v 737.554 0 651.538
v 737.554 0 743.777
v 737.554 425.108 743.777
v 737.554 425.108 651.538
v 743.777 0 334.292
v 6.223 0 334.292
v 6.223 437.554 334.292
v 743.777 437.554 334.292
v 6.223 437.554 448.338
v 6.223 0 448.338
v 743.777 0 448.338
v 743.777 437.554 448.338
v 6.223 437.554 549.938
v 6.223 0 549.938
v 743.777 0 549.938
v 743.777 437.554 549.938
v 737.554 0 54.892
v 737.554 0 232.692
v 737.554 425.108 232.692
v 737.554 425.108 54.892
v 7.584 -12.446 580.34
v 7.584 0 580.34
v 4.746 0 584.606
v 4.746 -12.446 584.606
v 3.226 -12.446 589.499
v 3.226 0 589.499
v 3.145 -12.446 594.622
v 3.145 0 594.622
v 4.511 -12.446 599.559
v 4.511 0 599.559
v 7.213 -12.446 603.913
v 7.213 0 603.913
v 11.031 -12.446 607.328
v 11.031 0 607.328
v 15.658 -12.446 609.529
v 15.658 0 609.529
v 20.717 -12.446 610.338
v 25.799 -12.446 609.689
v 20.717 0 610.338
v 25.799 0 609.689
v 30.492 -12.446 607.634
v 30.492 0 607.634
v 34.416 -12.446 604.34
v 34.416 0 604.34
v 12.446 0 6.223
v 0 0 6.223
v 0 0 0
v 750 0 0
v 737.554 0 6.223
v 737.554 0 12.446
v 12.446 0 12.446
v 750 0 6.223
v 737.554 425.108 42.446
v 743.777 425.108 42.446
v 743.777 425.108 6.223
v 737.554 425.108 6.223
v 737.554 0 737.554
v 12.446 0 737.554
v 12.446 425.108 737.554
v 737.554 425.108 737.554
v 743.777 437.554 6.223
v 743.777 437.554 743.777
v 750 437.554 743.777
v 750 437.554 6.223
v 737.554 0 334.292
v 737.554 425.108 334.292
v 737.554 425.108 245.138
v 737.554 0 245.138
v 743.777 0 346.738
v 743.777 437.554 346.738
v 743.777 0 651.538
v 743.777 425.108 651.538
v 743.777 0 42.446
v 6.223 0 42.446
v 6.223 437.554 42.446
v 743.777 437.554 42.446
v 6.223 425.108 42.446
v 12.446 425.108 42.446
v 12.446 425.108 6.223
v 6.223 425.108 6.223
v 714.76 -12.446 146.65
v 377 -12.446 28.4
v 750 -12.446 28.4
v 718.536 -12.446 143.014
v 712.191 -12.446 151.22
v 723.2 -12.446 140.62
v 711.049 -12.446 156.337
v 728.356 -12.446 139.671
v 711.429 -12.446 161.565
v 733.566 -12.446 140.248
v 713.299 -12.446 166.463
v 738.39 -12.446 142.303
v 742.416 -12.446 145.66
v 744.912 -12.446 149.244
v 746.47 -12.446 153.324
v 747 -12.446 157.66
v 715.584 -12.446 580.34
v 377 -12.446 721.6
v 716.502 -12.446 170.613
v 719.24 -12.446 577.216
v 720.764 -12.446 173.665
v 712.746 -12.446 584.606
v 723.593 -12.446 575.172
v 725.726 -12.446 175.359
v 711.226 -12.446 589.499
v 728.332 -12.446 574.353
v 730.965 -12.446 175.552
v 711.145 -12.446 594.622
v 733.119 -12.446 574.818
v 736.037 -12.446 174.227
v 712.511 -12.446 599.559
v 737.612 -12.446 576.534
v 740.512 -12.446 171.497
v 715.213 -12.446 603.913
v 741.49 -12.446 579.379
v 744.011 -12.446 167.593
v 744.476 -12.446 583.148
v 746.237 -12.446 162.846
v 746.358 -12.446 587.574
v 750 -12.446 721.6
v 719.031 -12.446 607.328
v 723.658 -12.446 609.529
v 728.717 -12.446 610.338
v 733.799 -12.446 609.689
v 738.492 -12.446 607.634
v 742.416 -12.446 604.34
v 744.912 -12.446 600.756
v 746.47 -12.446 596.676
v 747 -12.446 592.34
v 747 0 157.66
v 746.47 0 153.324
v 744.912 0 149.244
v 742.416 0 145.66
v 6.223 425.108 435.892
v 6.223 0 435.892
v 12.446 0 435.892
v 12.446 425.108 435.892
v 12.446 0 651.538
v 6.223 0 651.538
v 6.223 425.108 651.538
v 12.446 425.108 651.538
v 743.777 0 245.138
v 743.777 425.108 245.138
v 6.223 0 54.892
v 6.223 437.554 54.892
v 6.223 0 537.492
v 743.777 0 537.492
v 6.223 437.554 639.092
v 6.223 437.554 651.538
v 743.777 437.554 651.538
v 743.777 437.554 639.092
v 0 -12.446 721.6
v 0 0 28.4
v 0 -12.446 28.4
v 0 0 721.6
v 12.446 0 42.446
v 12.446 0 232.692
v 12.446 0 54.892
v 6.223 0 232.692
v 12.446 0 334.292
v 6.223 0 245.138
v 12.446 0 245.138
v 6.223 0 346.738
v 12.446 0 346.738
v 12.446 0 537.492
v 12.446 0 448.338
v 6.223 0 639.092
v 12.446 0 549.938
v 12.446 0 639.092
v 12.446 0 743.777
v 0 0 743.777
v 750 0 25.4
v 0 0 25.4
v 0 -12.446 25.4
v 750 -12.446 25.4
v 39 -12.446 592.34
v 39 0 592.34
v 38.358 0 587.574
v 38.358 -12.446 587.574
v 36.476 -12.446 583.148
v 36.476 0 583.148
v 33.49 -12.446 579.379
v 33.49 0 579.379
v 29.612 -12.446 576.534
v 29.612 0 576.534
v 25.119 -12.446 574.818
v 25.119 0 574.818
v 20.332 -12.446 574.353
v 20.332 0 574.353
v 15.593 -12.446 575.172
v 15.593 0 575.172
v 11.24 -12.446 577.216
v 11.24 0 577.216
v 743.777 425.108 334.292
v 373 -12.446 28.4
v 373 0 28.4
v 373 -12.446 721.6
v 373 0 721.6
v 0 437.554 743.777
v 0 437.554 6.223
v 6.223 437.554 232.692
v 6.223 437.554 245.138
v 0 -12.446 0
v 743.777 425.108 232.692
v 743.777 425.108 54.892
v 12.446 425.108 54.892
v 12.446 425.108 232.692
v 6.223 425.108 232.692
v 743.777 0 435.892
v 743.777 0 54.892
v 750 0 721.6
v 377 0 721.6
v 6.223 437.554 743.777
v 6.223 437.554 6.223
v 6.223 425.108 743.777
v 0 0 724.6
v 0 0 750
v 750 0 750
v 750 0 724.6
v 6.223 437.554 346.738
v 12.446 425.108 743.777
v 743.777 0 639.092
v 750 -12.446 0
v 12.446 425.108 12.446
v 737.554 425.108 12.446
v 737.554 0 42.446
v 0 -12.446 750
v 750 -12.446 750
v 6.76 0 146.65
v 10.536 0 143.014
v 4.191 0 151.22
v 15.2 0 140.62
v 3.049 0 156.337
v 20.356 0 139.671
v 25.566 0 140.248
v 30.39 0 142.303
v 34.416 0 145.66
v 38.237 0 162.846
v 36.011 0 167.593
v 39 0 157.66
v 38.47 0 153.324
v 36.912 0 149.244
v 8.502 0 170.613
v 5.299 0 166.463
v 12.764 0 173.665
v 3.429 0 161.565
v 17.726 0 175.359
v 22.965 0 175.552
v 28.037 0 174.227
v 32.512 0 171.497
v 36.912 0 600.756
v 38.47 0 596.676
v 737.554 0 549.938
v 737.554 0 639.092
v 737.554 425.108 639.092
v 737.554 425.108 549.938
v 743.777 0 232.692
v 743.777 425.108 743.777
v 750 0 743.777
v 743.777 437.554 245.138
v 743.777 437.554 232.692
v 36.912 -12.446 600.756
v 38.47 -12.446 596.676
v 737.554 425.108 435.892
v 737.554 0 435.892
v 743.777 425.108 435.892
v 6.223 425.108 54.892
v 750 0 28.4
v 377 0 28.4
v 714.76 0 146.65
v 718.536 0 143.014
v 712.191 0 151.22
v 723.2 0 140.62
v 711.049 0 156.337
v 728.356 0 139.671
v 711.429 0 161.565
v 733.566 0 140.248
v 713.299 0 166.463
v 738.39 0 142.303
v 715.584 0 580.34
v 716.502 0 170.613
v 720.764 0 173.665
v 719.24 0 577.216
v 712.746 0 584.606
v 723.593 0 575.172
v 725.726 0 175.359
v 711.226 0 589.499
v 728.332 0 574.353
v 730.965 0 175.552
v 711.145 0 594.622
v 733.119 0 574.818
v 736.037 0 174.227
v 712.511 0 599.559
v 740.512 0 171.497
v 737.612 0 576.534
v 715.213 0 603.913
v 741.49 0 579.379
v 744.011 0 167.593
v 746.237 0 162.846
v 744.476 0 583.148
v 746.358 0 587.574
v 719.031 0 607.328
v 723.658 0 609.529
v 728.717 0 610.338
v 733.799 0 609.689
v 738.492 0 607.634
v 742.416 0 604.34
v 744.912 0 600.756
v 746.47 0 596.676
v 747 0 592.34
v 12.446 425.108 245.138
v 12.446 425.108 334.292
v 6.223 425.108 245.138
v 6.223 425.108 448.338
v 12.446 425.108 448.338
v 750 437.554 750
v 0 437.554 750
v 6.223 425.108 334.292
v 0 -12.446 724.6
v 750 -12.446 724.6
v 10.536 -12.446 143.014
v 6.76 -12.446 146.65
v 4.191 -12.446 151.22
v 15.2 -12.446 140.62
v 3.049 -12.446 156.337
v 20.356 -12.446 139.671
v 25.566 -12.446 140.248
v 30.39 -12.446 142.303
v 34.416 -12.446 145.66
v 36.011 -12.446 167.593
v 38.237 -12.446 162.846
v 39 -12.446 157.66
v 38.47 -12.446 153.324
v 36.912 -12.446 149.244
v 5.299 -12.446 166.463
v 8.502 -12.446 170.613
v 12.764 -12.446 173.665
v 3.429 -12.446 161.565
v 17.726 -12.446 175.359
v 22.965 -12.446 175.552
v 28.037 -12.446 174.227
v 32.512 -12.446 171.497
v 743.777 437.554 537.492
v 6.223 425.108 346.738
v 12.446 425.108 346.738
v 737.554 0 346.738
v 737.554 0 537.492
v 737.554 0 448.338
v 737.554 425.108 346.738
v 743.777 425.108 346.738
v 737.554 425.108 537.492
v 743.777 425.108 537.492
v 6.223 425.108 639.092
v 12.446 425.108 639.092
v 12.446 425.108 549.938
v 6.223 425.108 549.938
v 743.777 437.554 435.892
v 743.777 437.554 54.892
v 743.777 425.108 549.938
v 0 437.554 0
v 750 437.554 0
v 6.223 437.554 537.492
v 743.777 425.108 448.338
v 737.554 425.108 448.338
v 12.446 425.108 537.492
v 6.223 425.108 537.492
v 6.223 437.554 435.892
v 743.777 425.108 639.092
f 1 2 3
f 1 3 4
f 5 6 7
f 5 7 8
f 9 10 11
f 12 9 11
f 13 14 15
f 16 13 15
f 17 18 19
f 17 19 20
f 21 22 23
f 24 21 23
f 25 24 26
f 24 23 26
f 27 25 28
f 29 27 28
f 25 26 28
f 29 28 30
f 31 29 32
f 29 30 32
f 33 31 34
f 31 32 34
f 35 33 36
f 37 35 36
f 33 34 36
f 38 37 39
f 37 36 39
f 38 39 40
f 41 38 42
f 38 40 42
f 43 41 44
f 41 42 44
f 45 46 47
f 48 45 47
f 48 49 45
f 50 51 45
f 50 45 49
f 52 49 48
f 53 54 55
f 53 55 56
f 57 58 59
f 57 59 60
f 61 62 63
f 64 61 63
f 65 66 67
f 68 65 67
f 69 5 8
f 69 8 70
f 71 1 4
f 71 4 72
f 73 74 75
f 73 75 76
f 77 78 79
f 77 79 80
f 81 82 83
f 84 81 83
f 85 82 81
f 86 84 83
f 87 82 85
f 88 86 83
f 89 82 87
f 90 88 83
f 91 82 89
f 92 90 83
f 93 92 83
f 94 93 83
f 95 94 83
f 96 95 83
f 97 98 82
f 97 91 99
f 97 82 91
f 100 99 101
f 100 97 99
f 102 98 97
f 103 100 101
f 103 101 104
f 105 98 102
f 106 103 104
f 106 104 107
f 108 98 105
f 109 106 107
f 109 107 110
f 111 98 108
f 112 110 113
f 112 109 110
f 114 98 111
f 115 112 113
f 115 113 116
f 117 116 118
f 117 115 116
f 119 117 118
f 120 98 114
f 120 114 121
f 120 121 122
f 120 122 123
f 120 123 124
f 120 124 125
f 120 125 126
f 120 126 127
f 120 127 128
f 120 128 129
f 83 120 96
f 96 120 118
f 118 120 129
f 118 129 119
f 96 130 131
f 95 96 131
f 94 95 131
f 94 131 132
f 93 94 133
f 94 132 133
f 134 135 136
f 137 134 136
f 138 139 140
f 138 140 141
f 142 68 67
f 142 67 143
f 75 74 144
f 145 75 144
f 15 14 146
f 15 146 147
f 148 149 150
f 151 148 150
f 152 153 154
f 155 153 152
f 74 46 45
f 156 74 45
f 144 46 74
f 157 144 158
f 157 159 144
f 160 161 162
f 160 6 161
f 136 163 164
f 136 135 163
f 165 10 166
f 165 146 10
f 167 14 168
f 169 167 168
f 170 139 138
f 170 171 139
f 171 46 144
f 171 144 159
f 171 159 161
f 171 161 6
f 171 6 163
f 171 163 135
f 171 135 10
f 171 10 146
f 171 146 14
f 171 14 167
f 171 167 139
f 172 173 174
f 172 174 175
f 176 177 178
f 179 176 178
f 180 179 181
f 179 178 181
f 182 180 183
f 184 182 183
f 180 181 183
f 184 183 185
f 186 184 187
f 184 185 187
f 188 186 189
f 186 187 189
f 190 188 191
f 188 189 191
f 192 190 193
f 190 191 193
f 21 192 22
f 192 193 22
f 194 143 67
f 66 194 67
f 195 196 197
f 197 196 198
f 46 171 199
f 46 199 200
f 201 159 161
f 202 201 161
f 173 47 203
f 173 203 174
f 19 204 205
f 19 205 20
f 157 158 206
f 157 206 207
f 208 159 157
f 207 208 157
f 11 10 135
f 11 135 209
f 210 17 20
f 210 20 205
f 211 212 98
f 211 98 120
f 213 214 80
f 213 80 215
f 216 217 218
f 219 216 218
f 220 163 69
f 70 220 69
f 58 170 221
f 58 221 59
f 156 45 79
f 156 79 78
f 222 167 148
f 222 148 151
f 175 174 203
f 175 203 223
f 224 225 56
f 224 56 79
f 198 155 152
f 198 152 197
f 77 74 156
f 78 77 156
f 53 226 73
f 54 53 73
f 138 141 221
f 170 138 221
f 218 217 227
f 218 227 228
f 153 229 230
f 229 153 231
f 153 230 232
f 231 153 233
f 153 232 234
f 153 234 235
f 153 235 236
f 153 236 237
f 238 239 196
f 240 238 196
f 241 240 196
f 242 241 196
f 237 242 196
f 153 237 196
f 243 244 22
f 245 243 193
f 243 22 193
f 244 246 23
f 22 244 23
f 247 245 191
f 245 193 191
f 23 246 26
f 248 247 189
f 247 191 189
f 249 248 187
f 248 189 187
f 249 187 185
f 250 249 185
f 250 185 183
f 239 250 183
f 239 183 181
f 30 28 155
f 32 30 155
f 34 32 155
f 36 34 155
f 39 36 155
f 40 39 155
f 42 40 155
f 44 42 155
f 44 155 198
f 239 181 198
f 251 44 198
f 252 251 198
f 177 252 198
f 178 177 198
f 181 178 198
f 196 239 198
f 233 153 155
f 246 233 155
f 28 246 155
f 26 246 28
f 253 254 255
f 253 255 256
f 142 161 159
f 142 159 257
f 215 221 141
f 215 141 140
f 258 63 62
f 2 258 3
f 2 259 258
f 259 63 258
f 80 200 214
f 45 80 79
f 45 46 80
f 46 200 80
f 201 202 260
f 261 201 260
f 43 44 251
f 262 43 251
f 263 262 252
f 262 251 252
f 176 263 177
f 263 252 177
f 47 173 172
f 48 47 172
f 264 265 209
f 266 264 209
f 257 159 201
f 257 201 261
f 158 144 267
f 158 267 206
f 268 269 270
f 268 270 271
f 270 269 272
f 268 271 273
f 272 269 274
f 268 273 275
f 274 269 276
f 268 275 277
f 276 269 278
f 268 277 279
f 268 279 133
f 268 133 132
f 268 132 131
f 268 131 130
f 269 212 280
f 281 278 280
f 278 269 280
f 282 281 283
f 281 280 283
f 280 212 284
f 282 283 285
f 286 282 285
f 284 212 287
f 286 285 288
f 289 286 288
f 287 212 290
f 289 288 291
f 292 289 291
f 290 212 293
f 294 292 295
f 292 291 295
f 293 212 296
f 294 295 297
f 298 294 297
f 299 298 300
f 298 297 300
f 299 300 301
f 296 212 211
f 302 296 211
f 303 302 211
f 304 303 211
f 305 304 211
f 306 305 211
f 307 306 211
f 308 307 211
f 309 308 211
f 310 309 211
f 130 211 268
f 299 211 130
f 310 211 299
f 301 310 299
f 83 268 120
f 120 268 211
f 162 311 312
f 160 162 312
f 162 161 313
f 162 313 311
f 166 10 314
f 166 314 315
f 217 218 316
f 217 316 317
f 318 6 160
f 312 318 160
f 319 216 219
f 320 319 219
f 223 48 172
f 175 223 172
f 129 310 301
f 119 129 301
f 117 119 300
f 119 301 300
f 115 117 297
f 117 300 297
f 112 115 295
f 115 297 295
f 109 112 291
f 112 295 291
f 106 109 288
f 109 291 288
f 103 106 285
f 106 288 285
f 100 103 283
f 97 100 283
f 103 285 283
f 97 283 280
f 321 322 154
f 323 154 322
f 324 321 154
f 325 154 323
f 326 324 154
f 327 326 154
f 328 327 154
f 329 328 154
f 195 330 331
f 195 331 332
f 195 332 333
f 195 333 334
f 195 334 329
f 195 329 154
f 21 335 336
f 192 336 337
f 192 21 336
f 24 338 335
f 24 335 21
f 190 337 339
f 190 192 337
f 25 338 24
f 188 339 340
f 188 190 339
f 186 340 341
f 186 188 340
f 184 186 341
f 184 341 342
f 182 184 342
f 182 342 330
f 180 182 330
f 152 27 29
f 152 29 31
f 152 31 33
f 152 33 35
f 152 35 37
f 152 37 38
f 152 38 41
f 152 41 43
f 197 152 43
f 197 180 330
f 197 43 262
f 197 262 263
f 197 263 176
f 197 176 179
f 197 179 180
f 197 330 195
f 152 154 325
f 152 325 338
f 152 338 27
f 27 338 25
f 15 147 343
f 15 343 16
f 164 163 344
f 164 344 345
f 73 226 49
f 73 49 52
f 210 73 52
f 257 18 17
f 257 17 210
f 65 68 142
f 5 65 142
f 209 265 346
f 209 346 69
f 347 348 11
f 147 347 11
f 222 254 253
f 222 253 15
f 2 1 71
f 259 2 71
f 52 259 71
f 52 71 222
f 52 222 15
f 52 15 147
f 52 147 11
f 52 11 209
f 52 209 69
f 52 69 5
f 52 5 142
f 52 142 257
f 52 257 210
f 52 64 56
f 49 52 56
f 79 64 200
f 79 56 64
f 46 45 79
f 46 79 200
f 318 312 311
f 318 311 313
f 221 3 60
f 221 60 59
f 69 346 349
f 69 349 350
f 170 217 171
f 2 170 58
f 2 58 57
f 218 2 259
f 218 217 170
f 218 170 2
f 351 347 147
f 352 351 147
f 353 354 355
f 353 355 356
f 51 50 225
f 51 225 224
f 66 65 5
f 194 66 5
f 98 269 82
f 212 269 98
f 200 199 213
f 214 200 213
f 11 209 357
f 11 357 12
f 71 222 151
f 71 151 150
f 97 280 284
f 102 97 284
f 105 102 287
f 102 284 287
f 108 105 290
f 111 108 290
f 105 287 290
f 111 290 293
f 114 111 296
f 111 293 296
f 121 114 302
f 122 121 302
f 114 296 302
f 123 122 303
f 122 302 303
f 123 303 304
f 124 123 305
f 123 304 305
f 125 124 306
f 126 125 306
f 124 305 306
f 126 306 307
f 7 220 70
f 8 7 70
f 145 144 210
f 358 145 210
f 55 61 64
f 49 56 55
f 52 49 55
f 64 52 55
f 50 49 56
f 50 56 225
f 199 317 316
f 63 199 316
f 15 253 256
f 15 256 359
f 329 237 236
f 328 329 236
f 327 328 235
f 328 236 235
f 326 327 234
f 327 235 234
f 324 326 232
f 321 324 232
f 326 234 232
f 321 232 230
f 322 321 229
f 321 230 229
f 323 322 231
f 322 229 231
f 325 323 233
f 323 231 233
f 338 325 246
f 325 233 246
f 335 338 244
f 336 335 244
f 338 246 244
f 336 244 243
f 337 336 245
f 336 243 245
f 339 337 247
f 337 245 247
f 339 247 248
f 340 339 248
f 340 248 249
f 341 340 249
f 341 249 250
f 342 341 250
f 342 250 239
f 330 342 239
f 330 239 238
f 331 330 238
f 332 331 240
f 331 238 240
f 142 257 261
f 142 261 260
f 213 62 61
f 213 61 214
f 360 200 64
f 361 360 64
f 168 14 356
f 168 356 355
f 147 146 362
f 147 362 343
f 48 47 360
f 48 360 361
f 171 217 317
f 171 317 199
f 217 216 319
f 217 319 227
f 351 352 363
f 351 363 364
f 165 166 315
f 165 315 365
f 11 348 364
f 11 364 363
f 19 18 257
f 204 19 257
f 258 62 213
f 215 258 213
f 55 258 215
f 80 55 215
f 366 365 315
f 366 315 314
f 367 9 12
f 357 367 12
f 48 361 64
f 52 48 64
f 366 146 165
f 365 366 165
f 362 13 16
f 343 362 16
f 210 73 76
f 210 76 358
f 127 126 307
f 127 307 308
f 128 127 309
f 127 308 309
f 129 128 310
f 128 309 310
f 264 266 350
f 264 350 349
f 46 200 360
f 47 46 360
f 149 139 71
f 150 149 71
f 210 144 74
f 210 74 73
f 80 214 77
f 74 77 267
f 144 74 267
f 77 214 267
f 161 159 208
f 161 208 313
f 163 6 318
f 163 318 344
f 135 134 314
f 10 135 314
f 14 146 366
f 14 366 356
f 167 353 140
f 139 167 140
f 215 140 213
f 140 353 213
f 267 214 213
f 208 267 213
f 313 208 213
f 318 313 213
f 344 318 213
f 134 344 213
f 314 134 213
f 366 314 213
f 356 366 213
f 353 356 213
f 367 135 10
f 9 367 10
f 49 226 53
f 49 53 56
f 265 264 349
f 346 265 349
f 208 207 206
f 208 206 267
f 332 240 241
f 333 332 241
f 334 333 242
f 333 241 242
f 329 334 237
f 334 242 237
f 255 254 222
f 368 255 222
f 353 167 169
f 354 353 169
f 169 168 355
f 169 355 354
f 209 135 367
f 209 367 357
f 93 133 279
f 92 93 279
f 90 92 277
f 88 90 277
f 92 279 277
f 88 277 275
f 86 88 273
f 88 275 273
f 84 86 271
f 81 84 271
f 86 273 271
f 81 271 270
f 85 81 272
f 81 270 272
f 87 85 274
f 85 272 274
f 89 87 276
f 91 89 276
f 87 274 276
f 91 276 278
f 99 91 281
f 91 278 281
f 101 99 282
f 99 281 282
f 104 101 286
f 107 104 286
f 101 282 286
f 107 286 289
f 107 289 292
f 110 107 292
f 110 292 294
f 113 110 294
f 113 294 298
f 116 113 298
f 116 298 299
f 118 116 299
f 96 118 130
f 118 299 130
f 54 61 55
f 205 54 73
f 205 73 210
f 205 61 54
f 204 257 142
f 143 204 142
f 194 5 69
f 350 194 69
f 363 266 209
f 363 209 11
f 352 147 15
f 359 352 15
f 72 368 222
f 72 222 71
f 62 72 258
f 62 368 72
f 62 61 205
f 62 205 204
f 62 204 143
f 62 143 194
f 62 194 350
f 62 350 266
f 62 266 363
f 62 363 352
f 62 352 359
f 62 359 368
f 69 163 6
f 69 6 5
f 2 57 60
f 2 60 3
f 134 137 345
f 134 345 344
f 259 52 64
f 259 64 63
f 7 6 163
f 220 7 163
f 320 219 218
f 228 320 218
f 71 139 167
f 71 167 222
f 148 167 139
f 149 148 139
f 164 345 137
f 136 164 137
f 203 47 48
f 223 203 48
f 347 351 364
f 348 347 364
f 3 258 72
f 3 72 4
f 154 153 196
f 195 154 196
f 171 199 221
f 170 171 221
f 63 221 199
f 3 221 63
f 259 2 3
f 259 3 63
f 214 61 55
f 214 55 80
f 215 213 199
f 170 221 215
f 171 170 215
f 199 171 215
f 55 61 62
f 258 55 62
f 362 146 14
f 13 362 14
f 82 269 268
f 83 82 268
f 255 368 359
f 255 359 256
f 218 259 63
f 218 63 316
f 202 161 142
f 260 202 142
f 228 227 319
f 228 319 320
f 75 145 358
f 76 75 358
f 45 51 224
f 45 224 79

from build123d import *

# Parameters (mm, degrees)
F8_DEPTH  = 437.554
F9_DEPTH  = 437.554
F10_W     = 737.554
F10_H     = 737.554
F11_DEPTH = 12.446
F6_W      = 737.554
F6_H      = 12.446
F13_DEPTH = 437.554
F7_W      = 750
F7_H      = 25.4
F15_DEPTH = 12.446
F7_W_2    = 373
F7_H_2    = 693.2


with BuildPart() as f8:
    # F5 (on Front) → F8 (new body)
    with BuildSketch(Plane.XZ):
        Polygon((0, 750), (0, 743.777), (12.446, 743.777), (12.446, 737.554), (737.554, 737.554), (737.554, 743.777), (750, 743.777), (750, 750), align=None)
    extrude(amount=-F8_DEPTH)


with BuildPart() as f8b:
    # F5 (on Front) → F8, piece 2 (new body)
    with BuildSketch(Plane.XZ):
        Polygon((0, 6.223), (0, 0), (750, 0), (750, 6.223), (737.554, 6.223), (737.554, 12.446), (12.446, 12.446), (12.446, 6.223), align=None)
    extrude(amount=-F8_DEPTH)


with BuildPart() as f9:
    # F5 (on Front) → F9 (new body, through all)
    with BuildSketch(Plane.XZ):
        Polygon((0, 743.777), (0, 6.223), (12.446, 6.223), (12.446, 12.446), (12.446, 737.554), (12.446, 743.777), align=None)
    extrude(amount=-F9_DEPTH)


with BuildPart() as f9b:
    # F5 (on Front) → F9, piece 2 (new body, through all)
    with BuildSketch(Plane.XZ):
        Polygon((737.554, 6.223), (750, 6.223), (750, 743.777), (737.554, 743.777), (737.554, 737.554), (737.554, 12.446), align=None)
    extrude(amount=-F9_DEPTH)


with BuildPart() as f11:
    # F10 (on face) → F11 (new body)
    with BuildSketch(Plane(origin=(0, 437.554, 0), x_dir=(-1, 0, 0), z_dir=(0, 1, 0))):
        with Locations((-375, 375)):
            Rectangle(F10_W, F10_H)
    extrude(amount=-F11_DEPTH)


with BuildPart() as f8_1:
    add(f8.part)

    # F12: cut F11
    add(f11.part, mode=Mode.SUBTRACT)


with BuildPart() as f9b_1:
    add(f9b.part)

    # F12: cut F11
    add(f11.part, mode=Mode.SUBTRACT)


with BuildPart() as f9_1:
    add(f9.part)

    # F12: cut F11
    add(f11.part, mode=Mode.SUBTRACT)


with BuildPart() as f8b_1:
    add(f8b.part)

    # F12: cut F11
    add(f11.part, mode=Mode.SUBTRACT)


with BuildPart() as f13:
    # F6 (on Front) → F13 (new body)
    with BuildSketch(Plane.XZ):
        with Locations((375, 48.669)):
            Rectangle(F6_W, F6_H)
    extrude(amount=-F13_DEPTH)


with BuildPart() as f13b:
    # F6 (on Front) → F13, piece 2 (new body)
    with BuildSketch(Plane.XZ):
        with Locations((375, 238.915)):
            Rectangle(F6_W, F6_H)
    extrude(amount=-F13_DEPTH)


with BuildPart() as f13c:
    # F6 (on Front) → F13, piece 3 (new body)
    with BuildSketch(Plane.XZ):
        with Locations((375, 340.515)):
            Rectangle(F6_W, F6_H)
    extrude(amount=-F13_DEPTH)


with BuildPart() as f13d:
    # F6 (on Front) → F13, piece 4 (new body)
    with BuildSketch(Plane.XZ):
        with Locations((375, 442.115)):
            Rectangle(F6_W, F6_H)
    extrude(amount=-F13_DEPTH)


with BuildPart() as f13e:
    # F6 (on Front) → F13, piece 5 (new body)
    with BuildSketch(Plane.XZ):
        with Locations((375, 543.715)):
            Rectangle(F6_W, F6_H)
    extrude(amount=-F13_DEPTH)


with BuildPart() as f13f:
    # F6 (on Front) → F13, piece 6 (new body)
    with BuildSketch(Plane.XZ):
        with Locations((375, 645.315)):
            Rectangle(F6_W, F6_H)
    extrude(amount=-F13_DEPTH)


with BuildPart() as f9_2:
    add(f9_1.part)

    # F14: cut F13f, F13e, F13d, F13c, F13b, F13
    add(f13f.part, mode=Mode.SUBTRACT)
    add(f13e.part, mode=Mode.SUBTRACT)
    add(f13d.part, mode=Mode.SUBTRACT)
    add(f13c.part, mode=Mode.SUBTRACT)
    add(f13b.part, mode=Mode.SUBTRACT)
    add(f13.part, mode=Mode.SUBTRACT)


with BuildPart() as f9b_2:
    add(f9b_1.part)

    # F14: cut F13f, F13e, F13d, F13c, F13b, F13
    add(f13f.part, mode=Mode.SUBTRACT)
    add(f13e.part, mode=Mode.SUBTRACT)
    add(f13d.part, mode=Mode.SUBTRACT)
    add(f13c.part, mode=Mode.SUBTRACT)
    add(f13b.part, mode=Mode.SUBTRACT)
    add(f13.part, mode=Mode.SUBTRACT)


with BuildPart() as f15:
    # F7 (on Front) → F15 (new body)
    with BuildSketch(Plane.XZ):
        with Locations((375, 12.7)):
            Rectangle(F7_W, F7_H)
    extrude(amount=F15_DEPTH)


with BuildPart() as f15b:
    # F7 (on Front) → F15, piece 2 (new body)
    with BuildSketch(Plane.XZ):
        with Locations((375, 737.3)):
            Rectangle(F7_W, F7_H)
    extrude(amount=F15_DEPTH)


with BuildPart() as f15c:
    # F7 (on Front) → F15, piece 3 (new body)
    with BuildSketch(Plane.XZ):
        with Locations((186.5, 375)):
            Rectangle(F7_W_2, F7_H_2)
        with BuildLine():
            ThreePointArc((34.416407865, 169.6595549583), (37.8151024613, 164.0823525743), (39, 157.6595549583))
            ThreePointArc((39, 157.6595549583), (37.8151024613, 151.2367573424), (34.416407865, 145.6595549583))
            ThreePointArc((34.416407865, 145.6595549583), (21, 139.6595549583), (7.583592135, 145.6595549583))
            ThreePointArc((7.583592135, 145.6595549583), (3, 157.6595549583), (7.583592135, 169.6595549583))
            ThreePointArc((7.583592135, 169.6595549583), (21, 175.6595549583), (34.416407865, 169.6595549583))
        make_face(mode=Mode.SUBTRACT)
        with BuildLine():
            ThreePointArc((39, 592.3404450417), (37.8151024613, 585.9176474257), (34.416407865, 580.3404450417))
            ThreePointArc((34.416407865, 580.3404450417), (21, 574.3404450417), (7.583592135, 580.3404450417))
            ThreePointArc((7.583592135, 580.3404450417), (3, 592.3404450417), (7.583592135, 604.3404450417))
            ThreePointArc((7.583592135, 604.3404450417), (21, 610.3404450417), (34.416407865, 604.3404450417))
            ThreePointArc((34.416407865, 604.3404450417), (37.8151024613, 598.7632426576), (39, 592.3404450417))
        make_face(mode=Mode.SUBTRACT)
    extrude(amount=F15_DEPTH)


with BuildPart() as f15d:
    # F7 (on Front) → F15, piece 4 (new body)
    with BuildSketch(Plane.XZ):
        with Locations((563.5, 375)):
            Rectangle(F7_W_2, F7_H_2)
        with BuildLine():
            ThreePointArc((742.416407865, 169.6595549583), (745.8151024613, 164.0823525743), (747, 157.6595549583))
            ThreePointArc((747, 157.6595549583), (745.8151024613, 151.2367573424), (742.416407865, 145.6595549583))
            ThreePointArc((742.416407865, 145.6595549583), (729, 139.6595549583), (715.583592135, 145.6595549583))
            ThreePointArc((715.583592135, 145.6595549583), (711, 157.6595549583), (715.583592135, 169.6595549583))
            ThreePointArc((715.583592135, 169.6595549583), (729, 175.6595549583), (742.416407865, 169.6595549583))
        make_face(mode=Mode.SUBTRACT)
        with BuildLine():
            ThreePointArc((715.583592135, 604.3404450417), (729, 610.3404450417), (742.416407865, 604.3404450417))
            ThreePointArc((742.416407865, 604.3404450417), (745.8151024613, 598.7632426576), (747, 592.3404450417))
            ThreePointArc((747, 592.3404450417), (745.8151024613, 585.9176474257), (742.416407865, 580.3404450417))
            ThreePointArc((742.416407865, 580.3404450417), (729, 574.3404450417), (715.583592135, 580.3404450417))
            ThreePointArc((715.583592135, 580.3404450417), (711, 592.3404450417), (715.583592135, 604.3404450417))
        make_face(mode=Mode.SUBTRACT)
    extrude(amount=F15_DEPTH)


solid = Compound([f11.part, f8_1.part, f8b_1.part, f13.part, f13b.part, f13c.part, f13d.part, f13e.part, f13f.part, f9_2.part, f9b_2.part, f15.part, f15b.part, f15c.part, f15d.part])
